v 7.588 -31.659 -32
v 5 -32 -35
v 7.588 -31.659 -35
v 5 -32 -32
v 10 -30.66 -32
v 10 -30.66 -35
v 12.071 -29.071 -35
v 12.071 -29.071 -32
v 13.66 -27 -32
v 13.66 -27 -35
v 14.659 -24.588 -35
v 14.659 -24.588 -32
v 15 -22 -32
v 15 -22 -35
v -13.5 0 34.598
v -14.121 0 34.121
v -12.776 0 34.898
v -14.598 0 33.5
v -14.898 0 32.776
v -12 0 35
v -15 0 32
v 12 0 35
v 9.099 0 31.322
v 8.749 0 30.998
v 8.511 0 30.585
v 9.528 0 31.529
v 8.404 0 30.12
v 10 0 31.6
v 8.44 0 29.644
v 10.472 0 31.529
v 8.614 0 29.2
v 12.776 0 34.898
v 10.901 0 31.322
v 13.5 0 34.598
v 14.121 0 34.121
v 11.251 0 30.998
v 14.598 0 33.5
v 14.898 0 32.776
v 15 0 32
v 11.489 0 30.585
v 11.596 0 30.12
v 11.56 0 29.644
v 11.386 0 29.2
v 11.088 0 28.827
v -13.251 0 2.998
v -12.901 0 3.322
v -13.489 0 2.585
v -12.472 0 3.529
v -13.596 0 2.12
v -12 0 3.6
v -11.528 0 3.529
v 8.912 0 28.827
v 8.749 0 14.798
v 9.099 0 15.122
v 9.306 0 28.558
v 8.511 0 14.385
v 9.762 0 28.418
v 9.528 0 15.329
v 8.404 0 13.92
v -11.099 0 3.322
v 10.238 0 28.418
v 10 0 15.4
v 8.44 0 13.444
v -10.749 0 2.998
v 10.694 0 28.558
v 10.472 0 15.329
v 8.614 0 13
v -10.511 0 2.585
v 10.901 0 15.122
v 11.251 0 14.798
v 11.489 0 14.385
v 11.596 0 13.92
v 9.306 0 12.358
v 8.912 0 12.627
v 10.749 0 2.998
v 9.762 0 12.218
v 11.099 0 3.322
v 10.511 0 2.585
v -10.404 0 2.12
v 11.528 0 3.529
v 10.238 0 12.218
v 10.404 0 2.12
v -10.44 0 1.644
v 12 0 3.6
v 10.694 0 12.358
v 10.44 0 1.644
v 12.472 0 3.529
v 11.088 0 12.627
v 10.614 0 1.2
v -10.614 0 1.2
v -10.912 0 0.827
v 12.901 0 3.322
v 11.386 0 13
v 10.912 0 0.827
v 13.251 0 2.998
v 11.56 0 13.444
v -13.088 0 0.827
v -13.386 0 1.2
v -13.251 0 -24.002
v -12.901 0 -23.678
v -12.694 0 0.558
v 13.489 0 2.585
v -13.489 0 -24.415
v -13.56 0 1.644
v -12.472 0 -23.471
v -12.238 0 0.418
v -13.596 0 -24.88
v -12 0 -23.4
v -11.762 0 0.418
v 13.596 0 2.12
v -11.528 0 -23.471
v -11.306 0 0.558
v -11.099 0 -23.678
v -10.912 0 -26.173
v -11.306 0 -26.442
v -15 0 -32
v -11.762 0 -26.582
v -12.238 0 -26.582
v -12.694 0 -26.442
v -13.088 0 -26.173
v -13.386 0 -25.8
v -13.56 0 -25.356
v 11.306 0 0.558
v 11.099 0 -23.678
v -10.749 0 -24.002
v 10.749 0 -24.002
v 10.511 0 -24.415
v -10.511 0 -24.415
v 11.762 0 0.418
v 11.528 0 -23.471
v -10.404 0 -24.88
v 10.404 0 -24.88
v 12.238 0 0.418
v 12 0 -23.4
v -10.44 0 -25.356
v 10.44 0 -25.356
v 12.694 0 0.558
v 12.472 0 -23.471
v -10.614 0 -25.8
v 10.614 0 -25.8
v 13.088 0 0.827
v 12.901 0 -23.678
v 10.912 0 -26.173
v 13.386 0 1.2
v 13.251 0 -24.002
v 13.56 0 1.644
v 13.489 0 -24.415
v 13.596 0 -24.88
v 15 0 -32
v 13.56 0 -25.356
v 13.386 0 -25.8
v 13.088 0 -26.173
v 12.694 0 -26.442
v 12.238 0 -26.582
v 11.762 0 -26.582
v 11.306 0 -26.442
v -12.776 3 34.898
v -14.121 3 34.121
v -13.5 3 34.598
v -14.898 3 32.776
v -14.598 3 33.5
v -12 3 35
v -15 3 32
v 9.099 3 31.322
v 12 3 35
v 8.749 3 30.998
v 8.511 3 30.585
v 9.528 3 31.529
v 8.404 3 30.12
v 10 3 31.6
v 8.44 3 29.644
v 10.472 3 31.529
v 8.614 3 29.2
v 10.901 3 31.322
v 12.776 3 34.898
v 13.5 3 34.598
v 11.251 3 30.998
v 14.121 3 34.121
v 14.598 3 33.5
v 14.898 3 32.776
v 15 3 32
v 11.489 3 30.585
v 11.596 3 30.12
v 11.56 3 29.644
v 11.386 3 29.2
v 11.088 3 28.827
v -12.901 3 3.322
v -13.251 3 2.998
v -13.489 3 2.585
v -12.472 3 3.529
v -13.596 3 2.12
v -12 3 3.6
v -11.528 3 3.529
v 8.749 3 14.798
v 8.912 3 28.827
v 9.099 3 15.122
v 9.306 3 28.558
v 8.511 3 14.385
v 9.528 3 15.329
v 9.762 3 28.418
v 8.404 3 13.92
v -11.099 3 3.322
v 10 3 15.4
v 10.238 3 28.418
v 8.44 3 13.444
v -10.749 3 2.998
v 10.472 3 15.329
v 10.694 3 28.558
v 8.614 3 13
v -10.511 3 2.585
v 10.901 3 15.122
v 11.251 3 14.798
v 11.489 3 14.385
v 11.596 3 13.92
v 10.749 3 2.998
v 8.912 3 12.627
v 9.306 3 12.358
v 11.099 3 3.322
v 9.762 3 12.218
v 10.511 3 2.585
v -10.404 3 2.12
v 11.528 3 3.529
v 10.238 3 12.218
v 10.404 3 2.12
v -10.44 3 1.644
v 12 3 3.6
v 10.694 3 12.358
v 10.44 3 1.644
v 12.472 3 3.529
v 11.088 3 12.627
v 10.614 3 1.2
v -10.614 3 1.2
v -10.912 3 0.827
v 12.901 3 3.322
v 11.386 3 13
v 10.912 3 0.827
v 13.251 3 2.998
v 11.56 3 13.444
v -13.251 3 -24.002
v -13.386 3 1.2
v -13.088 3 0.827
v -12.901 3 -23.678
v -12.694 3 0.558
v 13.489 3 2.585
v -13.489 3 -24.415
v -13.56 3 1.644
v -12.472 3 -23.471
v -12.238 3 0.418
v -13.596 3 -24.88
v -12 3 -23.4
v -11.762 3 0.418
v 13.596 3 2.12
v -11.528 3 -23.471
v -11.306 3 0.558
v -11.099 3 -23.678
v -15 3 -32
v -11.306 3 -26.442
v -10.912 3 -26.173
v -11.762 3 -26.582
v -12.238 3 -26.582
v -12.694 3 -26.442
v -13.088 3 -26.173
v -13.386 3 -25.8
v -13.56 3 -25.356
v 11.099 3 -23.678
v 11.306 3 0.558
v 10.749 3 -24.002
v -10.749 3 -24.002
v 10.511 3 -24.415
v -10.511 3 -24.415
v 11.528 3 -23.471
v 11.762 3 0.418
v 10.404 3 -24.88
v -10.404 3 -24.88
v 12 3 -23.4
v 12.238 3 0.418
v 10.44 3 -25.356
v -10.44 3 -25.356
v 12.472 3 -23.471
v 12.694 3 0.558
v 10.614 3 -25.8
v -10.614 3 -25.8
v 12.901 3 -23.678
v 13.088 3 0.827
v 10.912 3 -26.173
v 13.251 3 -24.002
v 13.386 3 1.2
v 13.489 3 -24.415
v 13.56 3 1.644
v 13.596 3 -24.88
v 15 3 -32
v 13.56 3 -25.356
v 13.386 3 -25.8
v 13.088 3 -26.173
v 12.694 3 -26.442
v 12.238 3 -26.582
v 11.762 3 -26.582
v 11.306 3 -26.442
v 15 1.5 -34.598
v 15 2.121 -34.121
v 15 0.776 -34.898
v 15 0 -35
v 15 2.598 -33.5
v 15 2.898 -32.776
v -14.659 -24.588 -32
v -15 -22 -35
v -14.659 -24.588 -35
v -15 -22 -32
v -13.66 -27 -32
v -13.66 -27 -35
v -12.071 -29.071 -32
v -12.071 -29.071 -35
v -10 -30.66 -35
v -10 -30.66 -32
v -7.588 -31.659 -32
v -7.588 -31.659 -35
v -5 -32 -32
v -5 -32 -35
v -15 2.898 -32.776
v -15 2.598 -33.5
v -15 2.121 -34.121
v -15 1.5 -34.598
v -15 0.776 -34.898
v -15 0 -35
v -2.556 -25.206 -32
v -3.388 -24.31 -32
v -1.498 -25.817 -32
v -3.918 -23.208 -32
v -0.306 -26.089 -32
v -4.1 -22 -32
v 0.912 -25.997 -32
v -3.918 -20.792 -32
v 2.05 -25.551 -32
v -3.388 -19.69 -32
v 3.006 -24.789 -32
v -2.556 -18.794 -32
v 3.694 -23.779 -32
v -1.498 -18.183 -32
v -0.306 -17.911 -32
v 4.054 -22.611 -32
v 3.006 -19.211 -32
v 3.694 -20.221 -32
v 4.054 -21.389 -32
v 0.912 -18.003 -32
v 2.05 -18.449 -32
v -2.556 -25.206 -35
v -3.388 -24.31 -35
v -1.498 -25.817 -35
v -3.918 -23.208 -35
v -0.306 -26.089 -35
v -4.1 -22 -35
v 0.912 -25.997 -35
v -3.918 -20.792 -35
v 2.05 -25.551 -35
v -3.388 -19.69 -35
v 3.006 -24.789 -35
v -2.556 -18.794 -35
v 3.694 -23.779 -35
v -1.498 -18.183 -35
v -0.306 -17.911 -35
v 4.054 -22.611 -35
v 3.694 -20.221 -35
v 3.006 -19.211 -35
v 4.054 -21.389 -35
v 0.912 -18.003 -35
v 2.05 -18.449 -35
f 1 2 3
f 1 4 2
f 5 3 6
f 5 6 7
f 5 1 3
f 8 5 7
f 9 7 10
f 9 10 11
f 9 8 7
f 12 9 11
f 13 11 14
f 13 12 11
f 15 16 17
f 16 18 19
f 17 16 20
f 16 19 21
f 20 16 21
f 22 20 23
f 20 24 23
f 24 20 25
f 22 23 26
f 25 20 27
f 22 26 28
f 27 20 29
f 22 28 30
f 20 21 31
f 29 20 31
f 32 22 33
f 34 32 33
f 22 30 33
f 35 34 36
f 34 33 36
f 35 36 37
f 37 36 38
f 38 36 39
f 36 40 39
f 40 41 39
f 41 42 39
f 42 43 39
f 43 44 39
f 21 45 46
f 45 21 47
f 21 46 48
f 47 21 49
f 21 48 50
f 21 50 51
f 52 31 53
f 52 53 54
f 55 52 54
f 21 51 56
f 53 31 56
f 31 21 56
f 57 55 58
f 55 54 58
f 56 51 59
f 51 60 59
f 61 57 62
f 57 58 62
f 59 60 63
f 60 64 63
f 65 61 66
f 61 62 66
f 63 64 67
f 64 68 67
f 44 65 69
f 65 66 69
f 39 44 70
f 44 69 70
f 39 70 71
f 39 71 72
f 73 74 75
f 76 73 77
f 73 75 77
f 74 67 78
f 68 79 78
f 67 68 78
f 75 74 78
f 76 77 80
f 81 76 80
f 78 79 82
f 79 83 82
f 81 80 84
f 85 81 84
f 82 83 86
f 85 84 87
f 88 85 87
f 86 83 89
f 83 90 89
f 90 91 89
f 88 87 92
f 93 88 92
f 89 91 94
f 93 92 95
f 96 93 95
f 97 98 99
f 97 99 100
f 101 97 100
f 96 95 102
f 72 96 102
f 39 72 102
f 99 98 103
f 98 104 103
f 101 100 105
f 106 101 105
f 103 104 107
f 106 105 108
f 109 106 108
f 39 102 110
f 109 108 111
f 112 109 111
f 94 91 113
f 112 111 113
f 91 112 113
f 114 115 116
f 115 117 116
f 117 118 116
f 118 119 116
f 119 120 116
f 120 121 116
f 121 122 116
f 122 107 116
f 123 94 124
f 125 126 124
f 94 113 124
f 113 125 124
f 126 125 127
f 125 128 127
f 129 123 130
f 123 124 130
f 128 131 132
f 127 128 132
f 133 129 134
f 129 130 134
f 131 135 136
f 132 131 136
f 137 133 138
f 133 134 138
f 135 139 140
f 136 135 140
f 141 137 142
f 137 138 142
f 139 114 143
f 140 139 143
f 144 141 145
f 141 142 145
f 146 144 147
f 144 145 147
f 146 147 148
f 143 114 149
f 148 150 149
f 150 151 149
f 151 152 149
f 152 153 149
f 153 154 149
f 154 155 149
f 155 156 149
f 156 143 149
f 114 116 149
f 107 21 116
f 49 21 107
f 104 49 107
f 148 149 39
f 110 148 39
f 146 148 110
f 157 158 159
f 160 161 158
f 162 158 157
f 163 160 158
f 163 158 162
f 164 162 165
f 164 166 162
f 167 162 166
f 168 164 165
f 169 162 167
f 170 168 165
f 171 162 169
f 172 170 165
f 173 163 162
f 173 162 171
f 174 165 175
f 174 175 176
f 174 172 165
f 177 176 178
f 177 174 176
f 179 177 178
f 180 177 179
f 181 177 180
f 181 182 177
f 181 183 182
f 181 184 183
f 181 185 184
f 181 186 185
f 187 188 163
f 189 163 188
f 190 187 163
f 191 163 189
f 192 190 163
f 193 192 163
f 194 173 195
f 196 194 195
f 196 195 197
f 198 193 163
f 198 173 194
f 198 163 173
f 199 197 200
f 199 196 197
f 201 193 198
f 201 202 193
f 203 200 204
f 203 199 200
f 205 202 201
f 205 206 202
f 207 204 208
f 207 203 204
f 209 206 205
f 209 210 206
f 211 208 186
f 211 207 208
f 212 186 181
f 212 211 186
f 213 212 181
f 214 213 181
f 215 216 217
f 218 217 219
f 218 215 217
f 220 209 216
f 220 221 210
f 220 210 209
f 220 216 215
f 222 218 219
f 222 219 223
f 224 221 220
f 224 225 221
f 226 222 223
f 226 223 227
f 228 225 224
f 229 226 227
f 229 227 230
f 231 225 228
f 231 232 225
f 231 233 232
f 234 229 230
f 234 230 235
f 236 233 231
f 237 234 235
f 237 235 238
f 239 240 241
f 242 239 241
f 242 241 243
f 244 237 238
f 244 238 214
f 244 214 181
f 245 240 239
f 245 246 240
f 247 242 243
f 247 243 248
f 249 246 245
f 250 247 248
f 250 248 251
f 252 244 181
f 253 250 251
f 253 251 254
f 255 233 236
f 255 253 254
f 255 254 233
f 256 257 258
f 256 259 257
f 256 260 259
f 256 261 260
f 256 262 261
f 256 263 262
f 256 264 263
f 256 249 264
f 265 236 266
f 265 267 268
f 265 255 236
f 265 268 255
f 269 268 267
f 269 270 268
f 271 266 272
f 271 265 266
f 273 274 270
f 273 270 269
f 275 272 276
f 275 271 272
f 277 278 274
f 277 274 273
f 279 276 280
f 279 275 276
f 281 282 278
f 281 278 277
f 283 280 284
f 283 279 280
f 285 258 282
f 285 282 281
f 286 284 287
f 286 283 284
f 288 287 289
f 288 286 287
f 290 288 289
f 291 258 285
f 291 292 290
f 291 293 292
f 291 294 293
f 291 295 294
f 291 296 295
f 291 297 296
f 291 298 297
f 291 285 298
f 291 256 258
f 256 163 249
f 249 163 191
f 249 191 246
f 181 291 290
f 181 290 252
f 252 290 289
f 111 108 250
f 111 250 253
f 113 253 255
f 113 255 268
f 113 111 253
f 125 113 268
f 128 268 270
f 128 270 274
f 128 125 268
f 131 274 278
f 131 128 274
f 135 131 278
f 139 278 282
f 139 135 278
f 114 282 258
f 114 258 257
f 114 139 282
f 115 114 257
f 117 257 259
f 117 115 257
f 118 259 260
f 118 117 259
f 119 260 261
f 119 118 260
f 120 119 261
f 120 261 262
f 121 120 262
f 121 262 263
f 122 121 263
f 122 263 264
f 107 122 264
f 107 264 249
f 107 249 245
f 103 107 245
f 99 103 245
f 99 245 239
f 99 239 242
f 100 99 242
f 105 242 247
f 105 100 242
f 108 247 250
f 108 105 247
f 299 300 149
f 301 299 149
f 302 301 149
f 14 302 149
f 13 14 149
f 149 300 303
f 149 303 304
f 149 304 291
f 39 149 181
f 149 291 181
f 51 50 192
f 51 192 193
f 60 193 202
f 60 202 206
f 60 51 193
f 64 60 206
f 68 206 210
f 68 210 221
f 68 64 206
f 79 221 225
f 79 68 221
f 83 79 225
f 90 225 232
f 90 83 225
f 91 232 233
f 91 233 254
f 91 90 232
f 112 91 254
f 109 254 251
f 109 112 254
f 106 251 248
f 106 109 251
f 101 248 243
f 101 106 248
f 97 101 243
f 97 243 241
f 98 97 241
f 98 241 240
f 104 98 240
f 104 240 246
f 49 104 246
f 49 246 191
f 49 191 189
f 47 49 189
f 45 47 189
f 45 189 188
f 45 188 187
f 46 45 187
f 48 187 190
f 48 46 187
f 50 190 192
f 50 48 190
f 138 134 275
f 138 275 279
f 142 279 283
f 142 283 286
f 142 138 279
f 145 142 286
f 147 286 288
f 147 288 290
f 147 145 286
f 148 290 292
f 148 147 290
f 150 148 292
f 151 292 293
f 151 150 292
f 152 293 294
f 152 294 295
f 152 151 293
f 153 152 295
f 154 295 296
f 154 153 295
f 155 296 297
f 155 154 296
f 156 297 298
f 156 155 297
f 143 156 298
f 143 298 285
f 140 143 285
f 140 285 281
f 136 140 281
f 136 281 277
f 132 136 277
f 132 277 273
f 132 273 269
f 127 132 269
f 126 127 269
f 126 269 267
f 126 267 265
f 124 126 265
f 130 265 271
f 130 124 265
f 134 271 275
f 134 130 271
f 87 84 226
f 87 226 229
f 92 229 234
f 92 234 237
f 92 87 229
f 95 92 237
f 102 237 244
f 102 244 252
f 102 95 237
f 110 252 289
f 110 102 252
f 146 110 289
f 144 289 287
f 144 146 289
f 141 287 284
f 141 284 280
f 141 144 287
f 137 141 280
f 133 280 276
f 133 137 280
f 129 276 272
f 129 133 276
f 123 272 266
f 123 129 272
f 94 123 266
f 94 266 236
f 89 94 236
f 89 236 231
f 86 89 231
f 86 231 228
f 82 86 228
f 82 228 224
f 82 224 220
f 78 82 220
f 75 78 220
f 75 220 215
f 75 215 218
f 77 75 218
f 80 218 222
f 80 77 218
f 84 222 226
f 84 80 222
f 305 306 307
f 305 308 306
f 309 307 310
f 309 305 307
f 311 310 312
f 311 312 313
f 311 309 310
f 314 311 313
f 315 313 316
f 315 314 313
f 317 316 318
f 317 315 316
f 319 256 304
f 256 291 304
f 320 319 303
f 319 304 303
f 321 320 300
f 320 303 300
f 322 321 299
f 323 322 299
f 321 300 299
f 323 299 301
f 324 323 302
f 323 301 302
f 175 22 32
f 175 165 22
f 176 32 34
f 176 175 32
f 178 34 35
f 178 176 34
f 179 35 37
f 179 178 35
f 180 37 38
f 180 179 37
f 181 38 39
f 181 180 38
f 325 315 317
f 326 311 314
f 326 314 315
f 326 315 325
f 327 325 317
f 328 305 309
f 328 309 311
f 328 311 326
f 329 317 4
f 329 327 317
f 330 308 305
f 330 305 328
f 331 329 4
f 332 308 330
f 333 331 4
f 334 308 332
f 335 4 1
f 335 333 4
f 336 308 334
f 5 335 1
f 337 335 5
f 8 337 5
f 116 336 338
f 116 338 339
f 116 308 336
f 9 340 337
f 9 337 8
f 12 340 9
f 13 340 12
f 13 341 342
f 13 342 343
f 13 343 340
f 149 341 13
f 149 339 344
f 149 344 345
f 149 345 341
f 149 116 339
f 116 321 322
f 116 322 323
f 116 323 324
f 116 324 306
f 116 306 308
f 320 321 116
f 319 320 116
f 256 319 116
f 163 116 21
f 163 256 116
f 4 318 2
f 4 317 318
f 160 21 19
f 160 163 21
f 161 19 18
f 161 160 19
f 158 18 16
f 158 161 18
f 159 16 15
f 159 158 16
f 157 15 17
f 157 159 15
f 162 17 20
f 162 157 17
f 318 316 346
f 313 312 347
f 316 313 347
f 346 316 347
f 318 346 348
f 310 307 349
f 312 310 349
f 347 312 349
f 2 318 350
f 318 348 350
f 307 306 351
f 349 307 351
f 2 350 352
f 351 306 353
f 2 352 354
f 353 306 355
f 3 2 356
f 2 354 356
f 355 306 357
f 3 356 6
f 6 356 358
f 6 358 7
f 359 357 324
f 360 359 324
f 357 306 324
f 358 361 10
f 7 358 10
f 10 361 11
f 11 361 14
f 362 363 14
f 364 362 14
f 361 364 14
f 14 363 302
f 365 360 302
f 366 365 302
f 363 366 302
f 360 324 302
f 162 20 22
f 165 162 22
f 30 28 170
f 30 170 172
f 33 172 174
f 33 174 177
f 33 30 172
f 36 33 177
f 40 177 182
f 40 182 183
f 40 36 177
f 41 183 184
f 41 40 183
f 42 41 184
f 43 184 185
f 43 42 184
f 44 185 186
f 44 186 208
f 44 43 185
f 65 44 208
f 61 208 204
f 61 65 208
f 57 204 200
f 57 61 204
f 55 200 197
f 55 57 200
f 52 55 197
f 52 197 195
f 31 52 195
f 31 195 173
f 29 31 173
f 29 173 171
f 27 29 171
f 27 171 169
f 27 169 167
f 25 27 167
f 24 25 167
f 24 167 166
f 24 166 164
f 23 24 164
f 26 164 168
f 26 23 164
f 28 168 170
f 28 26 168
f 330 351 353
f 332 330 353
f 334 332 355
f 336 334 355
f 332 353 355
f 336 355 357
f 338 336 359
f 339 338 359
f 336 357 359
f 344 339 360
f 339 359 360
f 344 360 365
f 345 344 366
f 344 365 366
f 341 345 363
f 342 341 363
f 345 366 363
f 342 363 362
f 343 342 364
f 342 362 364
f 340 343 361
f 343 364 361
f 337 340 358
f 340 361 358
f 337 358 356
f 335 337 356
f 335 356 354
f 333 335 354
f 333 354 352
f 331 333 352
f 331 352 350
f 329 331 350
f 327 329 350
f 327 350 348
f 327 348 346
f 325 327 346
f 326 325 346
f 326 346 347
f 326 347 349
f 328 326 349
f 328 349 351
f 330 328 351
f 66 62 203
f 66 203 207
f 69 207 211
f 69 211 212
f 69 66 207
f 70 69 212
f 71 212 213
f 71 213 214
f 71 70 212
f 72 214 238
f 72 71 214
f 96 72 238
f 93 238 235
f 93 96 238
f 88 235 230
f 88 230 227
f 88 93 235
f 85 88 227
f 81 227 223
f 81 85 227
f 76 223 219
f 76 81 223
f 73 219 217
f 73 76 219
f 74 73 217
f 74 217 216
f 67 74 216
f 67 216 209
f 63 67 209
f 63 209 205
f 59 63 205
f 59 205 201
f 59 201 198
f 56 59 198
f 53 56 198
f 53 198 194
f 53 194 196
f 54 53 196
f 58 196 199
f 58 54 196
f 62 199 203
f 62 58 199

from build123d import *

# Parameters (mm, degrees)
SKETCH_1_W          = 30
SKETCH_1_H          = 70
SKETCH_1_R          = 1.6
EXTRUDE_1_DEPTH     = 3
SKETCH_2_W          = 30
SKETCH_2_H          = 3
EXTRUDE_2_DEPTH     = 32
CUT_EXTRUDE_1_REACH = 80.416
SKETCH_3_R          = 4.1
FILLET_1_R          = 3
FILLET_2_R          = 10


with BuildPart() as part:
    # 草图1 → 凸台-拉伸1 (new body)
    with BuildSketch(Plane(origin=(0, 0, 0), x_dir=(1, 0, 0), z_dir=(0, 1, 0))):
        Rectangle(SKETCH_1_W, SKETCH_1_H)
        with Locations(Location((-12, 25, 0), (0, 0, 270))):
            Circle(SKETCH_1_R, mode=Mode.SUBTRACT)
        with Locations(Location((12, 25, 0), (0, 0, 270))):
            Circle(SKETCH_1_R, mode=Mode.SUBTRACT)
        with Locations(Location((12, -2, 0), (0, 0, 270))):
            Circle(SKETCH_1_R, mode=Mode.SUBTRACT)
        with Locations(Location((-12, -2, 0), (0, 0, 270))):
            Circle(SKETCH_1_R, mode=Mode.SUBTRACT)
        with Locations(Location((10, -30, 0), (0, 0, 270))):
            Circle(SKETCH_1_R, mode=Mode.SUBTRACT)
        with Locations(Location((10, -13.8, 0), (0, 0, 270))):
            Circle(SKETCH_1_R, mode=Mode.SUBTRACT)
    extrude(amount=EXTRUDE_1_DEPTH)

    # 草图2 → 凸台-拉伸2 (add)
    with BuildSketch(Plane.XZ):
        with Locations((0, -33.5)):
            Rectangle(SKETCH_2_W, SKETCH_2_H)
    extrude(amount=EXTRUDE_2_DEPTH)

    # 草图3 → 切除-拉伸1 (cut, up to next)
    with BuildSketch(Plane(origin=(0, 0, -35), x_dir=(-1, 0, 0), z_dir=(0, 0, -1)), mode=Mode.PRIVATE) as cut_extrude_1_sk1:
        with Locations((0, -22)):
            Circle(SKETCH_3_R)
    cut_extrude_1_tool1 = extrude(cut_extrude_1_sk1.sketch, amount=-CUT_EXTRUDE_1_REACH, mode=Mode.PRIVATE) & part.part
    add(cut_extrude_1_tool1.solids().sort_by_distance((0, -22, -35))[0], mode=Mode.SUBTRACT)

    # 圆角1
    fillet_1_edges = [part.edges().sort_by_distance(p)[0] for p in [
        (15, 1.5, 35),
        (-15, 1.5, 35),
        (0, 3, -35),
    ]]
    fillet(fillet_1_edges, radius=FILLET_1_R)

    # 圆角2
    fillet_2_edges = [part.edges().sort_by_distance(p)[0] for p in [
        (15, -32, -33.5),
        (-15, -32, -33.5),
    ]]
    fillet(fillet_2_edges, radius=FILLET_2_R)


solid = part.part
